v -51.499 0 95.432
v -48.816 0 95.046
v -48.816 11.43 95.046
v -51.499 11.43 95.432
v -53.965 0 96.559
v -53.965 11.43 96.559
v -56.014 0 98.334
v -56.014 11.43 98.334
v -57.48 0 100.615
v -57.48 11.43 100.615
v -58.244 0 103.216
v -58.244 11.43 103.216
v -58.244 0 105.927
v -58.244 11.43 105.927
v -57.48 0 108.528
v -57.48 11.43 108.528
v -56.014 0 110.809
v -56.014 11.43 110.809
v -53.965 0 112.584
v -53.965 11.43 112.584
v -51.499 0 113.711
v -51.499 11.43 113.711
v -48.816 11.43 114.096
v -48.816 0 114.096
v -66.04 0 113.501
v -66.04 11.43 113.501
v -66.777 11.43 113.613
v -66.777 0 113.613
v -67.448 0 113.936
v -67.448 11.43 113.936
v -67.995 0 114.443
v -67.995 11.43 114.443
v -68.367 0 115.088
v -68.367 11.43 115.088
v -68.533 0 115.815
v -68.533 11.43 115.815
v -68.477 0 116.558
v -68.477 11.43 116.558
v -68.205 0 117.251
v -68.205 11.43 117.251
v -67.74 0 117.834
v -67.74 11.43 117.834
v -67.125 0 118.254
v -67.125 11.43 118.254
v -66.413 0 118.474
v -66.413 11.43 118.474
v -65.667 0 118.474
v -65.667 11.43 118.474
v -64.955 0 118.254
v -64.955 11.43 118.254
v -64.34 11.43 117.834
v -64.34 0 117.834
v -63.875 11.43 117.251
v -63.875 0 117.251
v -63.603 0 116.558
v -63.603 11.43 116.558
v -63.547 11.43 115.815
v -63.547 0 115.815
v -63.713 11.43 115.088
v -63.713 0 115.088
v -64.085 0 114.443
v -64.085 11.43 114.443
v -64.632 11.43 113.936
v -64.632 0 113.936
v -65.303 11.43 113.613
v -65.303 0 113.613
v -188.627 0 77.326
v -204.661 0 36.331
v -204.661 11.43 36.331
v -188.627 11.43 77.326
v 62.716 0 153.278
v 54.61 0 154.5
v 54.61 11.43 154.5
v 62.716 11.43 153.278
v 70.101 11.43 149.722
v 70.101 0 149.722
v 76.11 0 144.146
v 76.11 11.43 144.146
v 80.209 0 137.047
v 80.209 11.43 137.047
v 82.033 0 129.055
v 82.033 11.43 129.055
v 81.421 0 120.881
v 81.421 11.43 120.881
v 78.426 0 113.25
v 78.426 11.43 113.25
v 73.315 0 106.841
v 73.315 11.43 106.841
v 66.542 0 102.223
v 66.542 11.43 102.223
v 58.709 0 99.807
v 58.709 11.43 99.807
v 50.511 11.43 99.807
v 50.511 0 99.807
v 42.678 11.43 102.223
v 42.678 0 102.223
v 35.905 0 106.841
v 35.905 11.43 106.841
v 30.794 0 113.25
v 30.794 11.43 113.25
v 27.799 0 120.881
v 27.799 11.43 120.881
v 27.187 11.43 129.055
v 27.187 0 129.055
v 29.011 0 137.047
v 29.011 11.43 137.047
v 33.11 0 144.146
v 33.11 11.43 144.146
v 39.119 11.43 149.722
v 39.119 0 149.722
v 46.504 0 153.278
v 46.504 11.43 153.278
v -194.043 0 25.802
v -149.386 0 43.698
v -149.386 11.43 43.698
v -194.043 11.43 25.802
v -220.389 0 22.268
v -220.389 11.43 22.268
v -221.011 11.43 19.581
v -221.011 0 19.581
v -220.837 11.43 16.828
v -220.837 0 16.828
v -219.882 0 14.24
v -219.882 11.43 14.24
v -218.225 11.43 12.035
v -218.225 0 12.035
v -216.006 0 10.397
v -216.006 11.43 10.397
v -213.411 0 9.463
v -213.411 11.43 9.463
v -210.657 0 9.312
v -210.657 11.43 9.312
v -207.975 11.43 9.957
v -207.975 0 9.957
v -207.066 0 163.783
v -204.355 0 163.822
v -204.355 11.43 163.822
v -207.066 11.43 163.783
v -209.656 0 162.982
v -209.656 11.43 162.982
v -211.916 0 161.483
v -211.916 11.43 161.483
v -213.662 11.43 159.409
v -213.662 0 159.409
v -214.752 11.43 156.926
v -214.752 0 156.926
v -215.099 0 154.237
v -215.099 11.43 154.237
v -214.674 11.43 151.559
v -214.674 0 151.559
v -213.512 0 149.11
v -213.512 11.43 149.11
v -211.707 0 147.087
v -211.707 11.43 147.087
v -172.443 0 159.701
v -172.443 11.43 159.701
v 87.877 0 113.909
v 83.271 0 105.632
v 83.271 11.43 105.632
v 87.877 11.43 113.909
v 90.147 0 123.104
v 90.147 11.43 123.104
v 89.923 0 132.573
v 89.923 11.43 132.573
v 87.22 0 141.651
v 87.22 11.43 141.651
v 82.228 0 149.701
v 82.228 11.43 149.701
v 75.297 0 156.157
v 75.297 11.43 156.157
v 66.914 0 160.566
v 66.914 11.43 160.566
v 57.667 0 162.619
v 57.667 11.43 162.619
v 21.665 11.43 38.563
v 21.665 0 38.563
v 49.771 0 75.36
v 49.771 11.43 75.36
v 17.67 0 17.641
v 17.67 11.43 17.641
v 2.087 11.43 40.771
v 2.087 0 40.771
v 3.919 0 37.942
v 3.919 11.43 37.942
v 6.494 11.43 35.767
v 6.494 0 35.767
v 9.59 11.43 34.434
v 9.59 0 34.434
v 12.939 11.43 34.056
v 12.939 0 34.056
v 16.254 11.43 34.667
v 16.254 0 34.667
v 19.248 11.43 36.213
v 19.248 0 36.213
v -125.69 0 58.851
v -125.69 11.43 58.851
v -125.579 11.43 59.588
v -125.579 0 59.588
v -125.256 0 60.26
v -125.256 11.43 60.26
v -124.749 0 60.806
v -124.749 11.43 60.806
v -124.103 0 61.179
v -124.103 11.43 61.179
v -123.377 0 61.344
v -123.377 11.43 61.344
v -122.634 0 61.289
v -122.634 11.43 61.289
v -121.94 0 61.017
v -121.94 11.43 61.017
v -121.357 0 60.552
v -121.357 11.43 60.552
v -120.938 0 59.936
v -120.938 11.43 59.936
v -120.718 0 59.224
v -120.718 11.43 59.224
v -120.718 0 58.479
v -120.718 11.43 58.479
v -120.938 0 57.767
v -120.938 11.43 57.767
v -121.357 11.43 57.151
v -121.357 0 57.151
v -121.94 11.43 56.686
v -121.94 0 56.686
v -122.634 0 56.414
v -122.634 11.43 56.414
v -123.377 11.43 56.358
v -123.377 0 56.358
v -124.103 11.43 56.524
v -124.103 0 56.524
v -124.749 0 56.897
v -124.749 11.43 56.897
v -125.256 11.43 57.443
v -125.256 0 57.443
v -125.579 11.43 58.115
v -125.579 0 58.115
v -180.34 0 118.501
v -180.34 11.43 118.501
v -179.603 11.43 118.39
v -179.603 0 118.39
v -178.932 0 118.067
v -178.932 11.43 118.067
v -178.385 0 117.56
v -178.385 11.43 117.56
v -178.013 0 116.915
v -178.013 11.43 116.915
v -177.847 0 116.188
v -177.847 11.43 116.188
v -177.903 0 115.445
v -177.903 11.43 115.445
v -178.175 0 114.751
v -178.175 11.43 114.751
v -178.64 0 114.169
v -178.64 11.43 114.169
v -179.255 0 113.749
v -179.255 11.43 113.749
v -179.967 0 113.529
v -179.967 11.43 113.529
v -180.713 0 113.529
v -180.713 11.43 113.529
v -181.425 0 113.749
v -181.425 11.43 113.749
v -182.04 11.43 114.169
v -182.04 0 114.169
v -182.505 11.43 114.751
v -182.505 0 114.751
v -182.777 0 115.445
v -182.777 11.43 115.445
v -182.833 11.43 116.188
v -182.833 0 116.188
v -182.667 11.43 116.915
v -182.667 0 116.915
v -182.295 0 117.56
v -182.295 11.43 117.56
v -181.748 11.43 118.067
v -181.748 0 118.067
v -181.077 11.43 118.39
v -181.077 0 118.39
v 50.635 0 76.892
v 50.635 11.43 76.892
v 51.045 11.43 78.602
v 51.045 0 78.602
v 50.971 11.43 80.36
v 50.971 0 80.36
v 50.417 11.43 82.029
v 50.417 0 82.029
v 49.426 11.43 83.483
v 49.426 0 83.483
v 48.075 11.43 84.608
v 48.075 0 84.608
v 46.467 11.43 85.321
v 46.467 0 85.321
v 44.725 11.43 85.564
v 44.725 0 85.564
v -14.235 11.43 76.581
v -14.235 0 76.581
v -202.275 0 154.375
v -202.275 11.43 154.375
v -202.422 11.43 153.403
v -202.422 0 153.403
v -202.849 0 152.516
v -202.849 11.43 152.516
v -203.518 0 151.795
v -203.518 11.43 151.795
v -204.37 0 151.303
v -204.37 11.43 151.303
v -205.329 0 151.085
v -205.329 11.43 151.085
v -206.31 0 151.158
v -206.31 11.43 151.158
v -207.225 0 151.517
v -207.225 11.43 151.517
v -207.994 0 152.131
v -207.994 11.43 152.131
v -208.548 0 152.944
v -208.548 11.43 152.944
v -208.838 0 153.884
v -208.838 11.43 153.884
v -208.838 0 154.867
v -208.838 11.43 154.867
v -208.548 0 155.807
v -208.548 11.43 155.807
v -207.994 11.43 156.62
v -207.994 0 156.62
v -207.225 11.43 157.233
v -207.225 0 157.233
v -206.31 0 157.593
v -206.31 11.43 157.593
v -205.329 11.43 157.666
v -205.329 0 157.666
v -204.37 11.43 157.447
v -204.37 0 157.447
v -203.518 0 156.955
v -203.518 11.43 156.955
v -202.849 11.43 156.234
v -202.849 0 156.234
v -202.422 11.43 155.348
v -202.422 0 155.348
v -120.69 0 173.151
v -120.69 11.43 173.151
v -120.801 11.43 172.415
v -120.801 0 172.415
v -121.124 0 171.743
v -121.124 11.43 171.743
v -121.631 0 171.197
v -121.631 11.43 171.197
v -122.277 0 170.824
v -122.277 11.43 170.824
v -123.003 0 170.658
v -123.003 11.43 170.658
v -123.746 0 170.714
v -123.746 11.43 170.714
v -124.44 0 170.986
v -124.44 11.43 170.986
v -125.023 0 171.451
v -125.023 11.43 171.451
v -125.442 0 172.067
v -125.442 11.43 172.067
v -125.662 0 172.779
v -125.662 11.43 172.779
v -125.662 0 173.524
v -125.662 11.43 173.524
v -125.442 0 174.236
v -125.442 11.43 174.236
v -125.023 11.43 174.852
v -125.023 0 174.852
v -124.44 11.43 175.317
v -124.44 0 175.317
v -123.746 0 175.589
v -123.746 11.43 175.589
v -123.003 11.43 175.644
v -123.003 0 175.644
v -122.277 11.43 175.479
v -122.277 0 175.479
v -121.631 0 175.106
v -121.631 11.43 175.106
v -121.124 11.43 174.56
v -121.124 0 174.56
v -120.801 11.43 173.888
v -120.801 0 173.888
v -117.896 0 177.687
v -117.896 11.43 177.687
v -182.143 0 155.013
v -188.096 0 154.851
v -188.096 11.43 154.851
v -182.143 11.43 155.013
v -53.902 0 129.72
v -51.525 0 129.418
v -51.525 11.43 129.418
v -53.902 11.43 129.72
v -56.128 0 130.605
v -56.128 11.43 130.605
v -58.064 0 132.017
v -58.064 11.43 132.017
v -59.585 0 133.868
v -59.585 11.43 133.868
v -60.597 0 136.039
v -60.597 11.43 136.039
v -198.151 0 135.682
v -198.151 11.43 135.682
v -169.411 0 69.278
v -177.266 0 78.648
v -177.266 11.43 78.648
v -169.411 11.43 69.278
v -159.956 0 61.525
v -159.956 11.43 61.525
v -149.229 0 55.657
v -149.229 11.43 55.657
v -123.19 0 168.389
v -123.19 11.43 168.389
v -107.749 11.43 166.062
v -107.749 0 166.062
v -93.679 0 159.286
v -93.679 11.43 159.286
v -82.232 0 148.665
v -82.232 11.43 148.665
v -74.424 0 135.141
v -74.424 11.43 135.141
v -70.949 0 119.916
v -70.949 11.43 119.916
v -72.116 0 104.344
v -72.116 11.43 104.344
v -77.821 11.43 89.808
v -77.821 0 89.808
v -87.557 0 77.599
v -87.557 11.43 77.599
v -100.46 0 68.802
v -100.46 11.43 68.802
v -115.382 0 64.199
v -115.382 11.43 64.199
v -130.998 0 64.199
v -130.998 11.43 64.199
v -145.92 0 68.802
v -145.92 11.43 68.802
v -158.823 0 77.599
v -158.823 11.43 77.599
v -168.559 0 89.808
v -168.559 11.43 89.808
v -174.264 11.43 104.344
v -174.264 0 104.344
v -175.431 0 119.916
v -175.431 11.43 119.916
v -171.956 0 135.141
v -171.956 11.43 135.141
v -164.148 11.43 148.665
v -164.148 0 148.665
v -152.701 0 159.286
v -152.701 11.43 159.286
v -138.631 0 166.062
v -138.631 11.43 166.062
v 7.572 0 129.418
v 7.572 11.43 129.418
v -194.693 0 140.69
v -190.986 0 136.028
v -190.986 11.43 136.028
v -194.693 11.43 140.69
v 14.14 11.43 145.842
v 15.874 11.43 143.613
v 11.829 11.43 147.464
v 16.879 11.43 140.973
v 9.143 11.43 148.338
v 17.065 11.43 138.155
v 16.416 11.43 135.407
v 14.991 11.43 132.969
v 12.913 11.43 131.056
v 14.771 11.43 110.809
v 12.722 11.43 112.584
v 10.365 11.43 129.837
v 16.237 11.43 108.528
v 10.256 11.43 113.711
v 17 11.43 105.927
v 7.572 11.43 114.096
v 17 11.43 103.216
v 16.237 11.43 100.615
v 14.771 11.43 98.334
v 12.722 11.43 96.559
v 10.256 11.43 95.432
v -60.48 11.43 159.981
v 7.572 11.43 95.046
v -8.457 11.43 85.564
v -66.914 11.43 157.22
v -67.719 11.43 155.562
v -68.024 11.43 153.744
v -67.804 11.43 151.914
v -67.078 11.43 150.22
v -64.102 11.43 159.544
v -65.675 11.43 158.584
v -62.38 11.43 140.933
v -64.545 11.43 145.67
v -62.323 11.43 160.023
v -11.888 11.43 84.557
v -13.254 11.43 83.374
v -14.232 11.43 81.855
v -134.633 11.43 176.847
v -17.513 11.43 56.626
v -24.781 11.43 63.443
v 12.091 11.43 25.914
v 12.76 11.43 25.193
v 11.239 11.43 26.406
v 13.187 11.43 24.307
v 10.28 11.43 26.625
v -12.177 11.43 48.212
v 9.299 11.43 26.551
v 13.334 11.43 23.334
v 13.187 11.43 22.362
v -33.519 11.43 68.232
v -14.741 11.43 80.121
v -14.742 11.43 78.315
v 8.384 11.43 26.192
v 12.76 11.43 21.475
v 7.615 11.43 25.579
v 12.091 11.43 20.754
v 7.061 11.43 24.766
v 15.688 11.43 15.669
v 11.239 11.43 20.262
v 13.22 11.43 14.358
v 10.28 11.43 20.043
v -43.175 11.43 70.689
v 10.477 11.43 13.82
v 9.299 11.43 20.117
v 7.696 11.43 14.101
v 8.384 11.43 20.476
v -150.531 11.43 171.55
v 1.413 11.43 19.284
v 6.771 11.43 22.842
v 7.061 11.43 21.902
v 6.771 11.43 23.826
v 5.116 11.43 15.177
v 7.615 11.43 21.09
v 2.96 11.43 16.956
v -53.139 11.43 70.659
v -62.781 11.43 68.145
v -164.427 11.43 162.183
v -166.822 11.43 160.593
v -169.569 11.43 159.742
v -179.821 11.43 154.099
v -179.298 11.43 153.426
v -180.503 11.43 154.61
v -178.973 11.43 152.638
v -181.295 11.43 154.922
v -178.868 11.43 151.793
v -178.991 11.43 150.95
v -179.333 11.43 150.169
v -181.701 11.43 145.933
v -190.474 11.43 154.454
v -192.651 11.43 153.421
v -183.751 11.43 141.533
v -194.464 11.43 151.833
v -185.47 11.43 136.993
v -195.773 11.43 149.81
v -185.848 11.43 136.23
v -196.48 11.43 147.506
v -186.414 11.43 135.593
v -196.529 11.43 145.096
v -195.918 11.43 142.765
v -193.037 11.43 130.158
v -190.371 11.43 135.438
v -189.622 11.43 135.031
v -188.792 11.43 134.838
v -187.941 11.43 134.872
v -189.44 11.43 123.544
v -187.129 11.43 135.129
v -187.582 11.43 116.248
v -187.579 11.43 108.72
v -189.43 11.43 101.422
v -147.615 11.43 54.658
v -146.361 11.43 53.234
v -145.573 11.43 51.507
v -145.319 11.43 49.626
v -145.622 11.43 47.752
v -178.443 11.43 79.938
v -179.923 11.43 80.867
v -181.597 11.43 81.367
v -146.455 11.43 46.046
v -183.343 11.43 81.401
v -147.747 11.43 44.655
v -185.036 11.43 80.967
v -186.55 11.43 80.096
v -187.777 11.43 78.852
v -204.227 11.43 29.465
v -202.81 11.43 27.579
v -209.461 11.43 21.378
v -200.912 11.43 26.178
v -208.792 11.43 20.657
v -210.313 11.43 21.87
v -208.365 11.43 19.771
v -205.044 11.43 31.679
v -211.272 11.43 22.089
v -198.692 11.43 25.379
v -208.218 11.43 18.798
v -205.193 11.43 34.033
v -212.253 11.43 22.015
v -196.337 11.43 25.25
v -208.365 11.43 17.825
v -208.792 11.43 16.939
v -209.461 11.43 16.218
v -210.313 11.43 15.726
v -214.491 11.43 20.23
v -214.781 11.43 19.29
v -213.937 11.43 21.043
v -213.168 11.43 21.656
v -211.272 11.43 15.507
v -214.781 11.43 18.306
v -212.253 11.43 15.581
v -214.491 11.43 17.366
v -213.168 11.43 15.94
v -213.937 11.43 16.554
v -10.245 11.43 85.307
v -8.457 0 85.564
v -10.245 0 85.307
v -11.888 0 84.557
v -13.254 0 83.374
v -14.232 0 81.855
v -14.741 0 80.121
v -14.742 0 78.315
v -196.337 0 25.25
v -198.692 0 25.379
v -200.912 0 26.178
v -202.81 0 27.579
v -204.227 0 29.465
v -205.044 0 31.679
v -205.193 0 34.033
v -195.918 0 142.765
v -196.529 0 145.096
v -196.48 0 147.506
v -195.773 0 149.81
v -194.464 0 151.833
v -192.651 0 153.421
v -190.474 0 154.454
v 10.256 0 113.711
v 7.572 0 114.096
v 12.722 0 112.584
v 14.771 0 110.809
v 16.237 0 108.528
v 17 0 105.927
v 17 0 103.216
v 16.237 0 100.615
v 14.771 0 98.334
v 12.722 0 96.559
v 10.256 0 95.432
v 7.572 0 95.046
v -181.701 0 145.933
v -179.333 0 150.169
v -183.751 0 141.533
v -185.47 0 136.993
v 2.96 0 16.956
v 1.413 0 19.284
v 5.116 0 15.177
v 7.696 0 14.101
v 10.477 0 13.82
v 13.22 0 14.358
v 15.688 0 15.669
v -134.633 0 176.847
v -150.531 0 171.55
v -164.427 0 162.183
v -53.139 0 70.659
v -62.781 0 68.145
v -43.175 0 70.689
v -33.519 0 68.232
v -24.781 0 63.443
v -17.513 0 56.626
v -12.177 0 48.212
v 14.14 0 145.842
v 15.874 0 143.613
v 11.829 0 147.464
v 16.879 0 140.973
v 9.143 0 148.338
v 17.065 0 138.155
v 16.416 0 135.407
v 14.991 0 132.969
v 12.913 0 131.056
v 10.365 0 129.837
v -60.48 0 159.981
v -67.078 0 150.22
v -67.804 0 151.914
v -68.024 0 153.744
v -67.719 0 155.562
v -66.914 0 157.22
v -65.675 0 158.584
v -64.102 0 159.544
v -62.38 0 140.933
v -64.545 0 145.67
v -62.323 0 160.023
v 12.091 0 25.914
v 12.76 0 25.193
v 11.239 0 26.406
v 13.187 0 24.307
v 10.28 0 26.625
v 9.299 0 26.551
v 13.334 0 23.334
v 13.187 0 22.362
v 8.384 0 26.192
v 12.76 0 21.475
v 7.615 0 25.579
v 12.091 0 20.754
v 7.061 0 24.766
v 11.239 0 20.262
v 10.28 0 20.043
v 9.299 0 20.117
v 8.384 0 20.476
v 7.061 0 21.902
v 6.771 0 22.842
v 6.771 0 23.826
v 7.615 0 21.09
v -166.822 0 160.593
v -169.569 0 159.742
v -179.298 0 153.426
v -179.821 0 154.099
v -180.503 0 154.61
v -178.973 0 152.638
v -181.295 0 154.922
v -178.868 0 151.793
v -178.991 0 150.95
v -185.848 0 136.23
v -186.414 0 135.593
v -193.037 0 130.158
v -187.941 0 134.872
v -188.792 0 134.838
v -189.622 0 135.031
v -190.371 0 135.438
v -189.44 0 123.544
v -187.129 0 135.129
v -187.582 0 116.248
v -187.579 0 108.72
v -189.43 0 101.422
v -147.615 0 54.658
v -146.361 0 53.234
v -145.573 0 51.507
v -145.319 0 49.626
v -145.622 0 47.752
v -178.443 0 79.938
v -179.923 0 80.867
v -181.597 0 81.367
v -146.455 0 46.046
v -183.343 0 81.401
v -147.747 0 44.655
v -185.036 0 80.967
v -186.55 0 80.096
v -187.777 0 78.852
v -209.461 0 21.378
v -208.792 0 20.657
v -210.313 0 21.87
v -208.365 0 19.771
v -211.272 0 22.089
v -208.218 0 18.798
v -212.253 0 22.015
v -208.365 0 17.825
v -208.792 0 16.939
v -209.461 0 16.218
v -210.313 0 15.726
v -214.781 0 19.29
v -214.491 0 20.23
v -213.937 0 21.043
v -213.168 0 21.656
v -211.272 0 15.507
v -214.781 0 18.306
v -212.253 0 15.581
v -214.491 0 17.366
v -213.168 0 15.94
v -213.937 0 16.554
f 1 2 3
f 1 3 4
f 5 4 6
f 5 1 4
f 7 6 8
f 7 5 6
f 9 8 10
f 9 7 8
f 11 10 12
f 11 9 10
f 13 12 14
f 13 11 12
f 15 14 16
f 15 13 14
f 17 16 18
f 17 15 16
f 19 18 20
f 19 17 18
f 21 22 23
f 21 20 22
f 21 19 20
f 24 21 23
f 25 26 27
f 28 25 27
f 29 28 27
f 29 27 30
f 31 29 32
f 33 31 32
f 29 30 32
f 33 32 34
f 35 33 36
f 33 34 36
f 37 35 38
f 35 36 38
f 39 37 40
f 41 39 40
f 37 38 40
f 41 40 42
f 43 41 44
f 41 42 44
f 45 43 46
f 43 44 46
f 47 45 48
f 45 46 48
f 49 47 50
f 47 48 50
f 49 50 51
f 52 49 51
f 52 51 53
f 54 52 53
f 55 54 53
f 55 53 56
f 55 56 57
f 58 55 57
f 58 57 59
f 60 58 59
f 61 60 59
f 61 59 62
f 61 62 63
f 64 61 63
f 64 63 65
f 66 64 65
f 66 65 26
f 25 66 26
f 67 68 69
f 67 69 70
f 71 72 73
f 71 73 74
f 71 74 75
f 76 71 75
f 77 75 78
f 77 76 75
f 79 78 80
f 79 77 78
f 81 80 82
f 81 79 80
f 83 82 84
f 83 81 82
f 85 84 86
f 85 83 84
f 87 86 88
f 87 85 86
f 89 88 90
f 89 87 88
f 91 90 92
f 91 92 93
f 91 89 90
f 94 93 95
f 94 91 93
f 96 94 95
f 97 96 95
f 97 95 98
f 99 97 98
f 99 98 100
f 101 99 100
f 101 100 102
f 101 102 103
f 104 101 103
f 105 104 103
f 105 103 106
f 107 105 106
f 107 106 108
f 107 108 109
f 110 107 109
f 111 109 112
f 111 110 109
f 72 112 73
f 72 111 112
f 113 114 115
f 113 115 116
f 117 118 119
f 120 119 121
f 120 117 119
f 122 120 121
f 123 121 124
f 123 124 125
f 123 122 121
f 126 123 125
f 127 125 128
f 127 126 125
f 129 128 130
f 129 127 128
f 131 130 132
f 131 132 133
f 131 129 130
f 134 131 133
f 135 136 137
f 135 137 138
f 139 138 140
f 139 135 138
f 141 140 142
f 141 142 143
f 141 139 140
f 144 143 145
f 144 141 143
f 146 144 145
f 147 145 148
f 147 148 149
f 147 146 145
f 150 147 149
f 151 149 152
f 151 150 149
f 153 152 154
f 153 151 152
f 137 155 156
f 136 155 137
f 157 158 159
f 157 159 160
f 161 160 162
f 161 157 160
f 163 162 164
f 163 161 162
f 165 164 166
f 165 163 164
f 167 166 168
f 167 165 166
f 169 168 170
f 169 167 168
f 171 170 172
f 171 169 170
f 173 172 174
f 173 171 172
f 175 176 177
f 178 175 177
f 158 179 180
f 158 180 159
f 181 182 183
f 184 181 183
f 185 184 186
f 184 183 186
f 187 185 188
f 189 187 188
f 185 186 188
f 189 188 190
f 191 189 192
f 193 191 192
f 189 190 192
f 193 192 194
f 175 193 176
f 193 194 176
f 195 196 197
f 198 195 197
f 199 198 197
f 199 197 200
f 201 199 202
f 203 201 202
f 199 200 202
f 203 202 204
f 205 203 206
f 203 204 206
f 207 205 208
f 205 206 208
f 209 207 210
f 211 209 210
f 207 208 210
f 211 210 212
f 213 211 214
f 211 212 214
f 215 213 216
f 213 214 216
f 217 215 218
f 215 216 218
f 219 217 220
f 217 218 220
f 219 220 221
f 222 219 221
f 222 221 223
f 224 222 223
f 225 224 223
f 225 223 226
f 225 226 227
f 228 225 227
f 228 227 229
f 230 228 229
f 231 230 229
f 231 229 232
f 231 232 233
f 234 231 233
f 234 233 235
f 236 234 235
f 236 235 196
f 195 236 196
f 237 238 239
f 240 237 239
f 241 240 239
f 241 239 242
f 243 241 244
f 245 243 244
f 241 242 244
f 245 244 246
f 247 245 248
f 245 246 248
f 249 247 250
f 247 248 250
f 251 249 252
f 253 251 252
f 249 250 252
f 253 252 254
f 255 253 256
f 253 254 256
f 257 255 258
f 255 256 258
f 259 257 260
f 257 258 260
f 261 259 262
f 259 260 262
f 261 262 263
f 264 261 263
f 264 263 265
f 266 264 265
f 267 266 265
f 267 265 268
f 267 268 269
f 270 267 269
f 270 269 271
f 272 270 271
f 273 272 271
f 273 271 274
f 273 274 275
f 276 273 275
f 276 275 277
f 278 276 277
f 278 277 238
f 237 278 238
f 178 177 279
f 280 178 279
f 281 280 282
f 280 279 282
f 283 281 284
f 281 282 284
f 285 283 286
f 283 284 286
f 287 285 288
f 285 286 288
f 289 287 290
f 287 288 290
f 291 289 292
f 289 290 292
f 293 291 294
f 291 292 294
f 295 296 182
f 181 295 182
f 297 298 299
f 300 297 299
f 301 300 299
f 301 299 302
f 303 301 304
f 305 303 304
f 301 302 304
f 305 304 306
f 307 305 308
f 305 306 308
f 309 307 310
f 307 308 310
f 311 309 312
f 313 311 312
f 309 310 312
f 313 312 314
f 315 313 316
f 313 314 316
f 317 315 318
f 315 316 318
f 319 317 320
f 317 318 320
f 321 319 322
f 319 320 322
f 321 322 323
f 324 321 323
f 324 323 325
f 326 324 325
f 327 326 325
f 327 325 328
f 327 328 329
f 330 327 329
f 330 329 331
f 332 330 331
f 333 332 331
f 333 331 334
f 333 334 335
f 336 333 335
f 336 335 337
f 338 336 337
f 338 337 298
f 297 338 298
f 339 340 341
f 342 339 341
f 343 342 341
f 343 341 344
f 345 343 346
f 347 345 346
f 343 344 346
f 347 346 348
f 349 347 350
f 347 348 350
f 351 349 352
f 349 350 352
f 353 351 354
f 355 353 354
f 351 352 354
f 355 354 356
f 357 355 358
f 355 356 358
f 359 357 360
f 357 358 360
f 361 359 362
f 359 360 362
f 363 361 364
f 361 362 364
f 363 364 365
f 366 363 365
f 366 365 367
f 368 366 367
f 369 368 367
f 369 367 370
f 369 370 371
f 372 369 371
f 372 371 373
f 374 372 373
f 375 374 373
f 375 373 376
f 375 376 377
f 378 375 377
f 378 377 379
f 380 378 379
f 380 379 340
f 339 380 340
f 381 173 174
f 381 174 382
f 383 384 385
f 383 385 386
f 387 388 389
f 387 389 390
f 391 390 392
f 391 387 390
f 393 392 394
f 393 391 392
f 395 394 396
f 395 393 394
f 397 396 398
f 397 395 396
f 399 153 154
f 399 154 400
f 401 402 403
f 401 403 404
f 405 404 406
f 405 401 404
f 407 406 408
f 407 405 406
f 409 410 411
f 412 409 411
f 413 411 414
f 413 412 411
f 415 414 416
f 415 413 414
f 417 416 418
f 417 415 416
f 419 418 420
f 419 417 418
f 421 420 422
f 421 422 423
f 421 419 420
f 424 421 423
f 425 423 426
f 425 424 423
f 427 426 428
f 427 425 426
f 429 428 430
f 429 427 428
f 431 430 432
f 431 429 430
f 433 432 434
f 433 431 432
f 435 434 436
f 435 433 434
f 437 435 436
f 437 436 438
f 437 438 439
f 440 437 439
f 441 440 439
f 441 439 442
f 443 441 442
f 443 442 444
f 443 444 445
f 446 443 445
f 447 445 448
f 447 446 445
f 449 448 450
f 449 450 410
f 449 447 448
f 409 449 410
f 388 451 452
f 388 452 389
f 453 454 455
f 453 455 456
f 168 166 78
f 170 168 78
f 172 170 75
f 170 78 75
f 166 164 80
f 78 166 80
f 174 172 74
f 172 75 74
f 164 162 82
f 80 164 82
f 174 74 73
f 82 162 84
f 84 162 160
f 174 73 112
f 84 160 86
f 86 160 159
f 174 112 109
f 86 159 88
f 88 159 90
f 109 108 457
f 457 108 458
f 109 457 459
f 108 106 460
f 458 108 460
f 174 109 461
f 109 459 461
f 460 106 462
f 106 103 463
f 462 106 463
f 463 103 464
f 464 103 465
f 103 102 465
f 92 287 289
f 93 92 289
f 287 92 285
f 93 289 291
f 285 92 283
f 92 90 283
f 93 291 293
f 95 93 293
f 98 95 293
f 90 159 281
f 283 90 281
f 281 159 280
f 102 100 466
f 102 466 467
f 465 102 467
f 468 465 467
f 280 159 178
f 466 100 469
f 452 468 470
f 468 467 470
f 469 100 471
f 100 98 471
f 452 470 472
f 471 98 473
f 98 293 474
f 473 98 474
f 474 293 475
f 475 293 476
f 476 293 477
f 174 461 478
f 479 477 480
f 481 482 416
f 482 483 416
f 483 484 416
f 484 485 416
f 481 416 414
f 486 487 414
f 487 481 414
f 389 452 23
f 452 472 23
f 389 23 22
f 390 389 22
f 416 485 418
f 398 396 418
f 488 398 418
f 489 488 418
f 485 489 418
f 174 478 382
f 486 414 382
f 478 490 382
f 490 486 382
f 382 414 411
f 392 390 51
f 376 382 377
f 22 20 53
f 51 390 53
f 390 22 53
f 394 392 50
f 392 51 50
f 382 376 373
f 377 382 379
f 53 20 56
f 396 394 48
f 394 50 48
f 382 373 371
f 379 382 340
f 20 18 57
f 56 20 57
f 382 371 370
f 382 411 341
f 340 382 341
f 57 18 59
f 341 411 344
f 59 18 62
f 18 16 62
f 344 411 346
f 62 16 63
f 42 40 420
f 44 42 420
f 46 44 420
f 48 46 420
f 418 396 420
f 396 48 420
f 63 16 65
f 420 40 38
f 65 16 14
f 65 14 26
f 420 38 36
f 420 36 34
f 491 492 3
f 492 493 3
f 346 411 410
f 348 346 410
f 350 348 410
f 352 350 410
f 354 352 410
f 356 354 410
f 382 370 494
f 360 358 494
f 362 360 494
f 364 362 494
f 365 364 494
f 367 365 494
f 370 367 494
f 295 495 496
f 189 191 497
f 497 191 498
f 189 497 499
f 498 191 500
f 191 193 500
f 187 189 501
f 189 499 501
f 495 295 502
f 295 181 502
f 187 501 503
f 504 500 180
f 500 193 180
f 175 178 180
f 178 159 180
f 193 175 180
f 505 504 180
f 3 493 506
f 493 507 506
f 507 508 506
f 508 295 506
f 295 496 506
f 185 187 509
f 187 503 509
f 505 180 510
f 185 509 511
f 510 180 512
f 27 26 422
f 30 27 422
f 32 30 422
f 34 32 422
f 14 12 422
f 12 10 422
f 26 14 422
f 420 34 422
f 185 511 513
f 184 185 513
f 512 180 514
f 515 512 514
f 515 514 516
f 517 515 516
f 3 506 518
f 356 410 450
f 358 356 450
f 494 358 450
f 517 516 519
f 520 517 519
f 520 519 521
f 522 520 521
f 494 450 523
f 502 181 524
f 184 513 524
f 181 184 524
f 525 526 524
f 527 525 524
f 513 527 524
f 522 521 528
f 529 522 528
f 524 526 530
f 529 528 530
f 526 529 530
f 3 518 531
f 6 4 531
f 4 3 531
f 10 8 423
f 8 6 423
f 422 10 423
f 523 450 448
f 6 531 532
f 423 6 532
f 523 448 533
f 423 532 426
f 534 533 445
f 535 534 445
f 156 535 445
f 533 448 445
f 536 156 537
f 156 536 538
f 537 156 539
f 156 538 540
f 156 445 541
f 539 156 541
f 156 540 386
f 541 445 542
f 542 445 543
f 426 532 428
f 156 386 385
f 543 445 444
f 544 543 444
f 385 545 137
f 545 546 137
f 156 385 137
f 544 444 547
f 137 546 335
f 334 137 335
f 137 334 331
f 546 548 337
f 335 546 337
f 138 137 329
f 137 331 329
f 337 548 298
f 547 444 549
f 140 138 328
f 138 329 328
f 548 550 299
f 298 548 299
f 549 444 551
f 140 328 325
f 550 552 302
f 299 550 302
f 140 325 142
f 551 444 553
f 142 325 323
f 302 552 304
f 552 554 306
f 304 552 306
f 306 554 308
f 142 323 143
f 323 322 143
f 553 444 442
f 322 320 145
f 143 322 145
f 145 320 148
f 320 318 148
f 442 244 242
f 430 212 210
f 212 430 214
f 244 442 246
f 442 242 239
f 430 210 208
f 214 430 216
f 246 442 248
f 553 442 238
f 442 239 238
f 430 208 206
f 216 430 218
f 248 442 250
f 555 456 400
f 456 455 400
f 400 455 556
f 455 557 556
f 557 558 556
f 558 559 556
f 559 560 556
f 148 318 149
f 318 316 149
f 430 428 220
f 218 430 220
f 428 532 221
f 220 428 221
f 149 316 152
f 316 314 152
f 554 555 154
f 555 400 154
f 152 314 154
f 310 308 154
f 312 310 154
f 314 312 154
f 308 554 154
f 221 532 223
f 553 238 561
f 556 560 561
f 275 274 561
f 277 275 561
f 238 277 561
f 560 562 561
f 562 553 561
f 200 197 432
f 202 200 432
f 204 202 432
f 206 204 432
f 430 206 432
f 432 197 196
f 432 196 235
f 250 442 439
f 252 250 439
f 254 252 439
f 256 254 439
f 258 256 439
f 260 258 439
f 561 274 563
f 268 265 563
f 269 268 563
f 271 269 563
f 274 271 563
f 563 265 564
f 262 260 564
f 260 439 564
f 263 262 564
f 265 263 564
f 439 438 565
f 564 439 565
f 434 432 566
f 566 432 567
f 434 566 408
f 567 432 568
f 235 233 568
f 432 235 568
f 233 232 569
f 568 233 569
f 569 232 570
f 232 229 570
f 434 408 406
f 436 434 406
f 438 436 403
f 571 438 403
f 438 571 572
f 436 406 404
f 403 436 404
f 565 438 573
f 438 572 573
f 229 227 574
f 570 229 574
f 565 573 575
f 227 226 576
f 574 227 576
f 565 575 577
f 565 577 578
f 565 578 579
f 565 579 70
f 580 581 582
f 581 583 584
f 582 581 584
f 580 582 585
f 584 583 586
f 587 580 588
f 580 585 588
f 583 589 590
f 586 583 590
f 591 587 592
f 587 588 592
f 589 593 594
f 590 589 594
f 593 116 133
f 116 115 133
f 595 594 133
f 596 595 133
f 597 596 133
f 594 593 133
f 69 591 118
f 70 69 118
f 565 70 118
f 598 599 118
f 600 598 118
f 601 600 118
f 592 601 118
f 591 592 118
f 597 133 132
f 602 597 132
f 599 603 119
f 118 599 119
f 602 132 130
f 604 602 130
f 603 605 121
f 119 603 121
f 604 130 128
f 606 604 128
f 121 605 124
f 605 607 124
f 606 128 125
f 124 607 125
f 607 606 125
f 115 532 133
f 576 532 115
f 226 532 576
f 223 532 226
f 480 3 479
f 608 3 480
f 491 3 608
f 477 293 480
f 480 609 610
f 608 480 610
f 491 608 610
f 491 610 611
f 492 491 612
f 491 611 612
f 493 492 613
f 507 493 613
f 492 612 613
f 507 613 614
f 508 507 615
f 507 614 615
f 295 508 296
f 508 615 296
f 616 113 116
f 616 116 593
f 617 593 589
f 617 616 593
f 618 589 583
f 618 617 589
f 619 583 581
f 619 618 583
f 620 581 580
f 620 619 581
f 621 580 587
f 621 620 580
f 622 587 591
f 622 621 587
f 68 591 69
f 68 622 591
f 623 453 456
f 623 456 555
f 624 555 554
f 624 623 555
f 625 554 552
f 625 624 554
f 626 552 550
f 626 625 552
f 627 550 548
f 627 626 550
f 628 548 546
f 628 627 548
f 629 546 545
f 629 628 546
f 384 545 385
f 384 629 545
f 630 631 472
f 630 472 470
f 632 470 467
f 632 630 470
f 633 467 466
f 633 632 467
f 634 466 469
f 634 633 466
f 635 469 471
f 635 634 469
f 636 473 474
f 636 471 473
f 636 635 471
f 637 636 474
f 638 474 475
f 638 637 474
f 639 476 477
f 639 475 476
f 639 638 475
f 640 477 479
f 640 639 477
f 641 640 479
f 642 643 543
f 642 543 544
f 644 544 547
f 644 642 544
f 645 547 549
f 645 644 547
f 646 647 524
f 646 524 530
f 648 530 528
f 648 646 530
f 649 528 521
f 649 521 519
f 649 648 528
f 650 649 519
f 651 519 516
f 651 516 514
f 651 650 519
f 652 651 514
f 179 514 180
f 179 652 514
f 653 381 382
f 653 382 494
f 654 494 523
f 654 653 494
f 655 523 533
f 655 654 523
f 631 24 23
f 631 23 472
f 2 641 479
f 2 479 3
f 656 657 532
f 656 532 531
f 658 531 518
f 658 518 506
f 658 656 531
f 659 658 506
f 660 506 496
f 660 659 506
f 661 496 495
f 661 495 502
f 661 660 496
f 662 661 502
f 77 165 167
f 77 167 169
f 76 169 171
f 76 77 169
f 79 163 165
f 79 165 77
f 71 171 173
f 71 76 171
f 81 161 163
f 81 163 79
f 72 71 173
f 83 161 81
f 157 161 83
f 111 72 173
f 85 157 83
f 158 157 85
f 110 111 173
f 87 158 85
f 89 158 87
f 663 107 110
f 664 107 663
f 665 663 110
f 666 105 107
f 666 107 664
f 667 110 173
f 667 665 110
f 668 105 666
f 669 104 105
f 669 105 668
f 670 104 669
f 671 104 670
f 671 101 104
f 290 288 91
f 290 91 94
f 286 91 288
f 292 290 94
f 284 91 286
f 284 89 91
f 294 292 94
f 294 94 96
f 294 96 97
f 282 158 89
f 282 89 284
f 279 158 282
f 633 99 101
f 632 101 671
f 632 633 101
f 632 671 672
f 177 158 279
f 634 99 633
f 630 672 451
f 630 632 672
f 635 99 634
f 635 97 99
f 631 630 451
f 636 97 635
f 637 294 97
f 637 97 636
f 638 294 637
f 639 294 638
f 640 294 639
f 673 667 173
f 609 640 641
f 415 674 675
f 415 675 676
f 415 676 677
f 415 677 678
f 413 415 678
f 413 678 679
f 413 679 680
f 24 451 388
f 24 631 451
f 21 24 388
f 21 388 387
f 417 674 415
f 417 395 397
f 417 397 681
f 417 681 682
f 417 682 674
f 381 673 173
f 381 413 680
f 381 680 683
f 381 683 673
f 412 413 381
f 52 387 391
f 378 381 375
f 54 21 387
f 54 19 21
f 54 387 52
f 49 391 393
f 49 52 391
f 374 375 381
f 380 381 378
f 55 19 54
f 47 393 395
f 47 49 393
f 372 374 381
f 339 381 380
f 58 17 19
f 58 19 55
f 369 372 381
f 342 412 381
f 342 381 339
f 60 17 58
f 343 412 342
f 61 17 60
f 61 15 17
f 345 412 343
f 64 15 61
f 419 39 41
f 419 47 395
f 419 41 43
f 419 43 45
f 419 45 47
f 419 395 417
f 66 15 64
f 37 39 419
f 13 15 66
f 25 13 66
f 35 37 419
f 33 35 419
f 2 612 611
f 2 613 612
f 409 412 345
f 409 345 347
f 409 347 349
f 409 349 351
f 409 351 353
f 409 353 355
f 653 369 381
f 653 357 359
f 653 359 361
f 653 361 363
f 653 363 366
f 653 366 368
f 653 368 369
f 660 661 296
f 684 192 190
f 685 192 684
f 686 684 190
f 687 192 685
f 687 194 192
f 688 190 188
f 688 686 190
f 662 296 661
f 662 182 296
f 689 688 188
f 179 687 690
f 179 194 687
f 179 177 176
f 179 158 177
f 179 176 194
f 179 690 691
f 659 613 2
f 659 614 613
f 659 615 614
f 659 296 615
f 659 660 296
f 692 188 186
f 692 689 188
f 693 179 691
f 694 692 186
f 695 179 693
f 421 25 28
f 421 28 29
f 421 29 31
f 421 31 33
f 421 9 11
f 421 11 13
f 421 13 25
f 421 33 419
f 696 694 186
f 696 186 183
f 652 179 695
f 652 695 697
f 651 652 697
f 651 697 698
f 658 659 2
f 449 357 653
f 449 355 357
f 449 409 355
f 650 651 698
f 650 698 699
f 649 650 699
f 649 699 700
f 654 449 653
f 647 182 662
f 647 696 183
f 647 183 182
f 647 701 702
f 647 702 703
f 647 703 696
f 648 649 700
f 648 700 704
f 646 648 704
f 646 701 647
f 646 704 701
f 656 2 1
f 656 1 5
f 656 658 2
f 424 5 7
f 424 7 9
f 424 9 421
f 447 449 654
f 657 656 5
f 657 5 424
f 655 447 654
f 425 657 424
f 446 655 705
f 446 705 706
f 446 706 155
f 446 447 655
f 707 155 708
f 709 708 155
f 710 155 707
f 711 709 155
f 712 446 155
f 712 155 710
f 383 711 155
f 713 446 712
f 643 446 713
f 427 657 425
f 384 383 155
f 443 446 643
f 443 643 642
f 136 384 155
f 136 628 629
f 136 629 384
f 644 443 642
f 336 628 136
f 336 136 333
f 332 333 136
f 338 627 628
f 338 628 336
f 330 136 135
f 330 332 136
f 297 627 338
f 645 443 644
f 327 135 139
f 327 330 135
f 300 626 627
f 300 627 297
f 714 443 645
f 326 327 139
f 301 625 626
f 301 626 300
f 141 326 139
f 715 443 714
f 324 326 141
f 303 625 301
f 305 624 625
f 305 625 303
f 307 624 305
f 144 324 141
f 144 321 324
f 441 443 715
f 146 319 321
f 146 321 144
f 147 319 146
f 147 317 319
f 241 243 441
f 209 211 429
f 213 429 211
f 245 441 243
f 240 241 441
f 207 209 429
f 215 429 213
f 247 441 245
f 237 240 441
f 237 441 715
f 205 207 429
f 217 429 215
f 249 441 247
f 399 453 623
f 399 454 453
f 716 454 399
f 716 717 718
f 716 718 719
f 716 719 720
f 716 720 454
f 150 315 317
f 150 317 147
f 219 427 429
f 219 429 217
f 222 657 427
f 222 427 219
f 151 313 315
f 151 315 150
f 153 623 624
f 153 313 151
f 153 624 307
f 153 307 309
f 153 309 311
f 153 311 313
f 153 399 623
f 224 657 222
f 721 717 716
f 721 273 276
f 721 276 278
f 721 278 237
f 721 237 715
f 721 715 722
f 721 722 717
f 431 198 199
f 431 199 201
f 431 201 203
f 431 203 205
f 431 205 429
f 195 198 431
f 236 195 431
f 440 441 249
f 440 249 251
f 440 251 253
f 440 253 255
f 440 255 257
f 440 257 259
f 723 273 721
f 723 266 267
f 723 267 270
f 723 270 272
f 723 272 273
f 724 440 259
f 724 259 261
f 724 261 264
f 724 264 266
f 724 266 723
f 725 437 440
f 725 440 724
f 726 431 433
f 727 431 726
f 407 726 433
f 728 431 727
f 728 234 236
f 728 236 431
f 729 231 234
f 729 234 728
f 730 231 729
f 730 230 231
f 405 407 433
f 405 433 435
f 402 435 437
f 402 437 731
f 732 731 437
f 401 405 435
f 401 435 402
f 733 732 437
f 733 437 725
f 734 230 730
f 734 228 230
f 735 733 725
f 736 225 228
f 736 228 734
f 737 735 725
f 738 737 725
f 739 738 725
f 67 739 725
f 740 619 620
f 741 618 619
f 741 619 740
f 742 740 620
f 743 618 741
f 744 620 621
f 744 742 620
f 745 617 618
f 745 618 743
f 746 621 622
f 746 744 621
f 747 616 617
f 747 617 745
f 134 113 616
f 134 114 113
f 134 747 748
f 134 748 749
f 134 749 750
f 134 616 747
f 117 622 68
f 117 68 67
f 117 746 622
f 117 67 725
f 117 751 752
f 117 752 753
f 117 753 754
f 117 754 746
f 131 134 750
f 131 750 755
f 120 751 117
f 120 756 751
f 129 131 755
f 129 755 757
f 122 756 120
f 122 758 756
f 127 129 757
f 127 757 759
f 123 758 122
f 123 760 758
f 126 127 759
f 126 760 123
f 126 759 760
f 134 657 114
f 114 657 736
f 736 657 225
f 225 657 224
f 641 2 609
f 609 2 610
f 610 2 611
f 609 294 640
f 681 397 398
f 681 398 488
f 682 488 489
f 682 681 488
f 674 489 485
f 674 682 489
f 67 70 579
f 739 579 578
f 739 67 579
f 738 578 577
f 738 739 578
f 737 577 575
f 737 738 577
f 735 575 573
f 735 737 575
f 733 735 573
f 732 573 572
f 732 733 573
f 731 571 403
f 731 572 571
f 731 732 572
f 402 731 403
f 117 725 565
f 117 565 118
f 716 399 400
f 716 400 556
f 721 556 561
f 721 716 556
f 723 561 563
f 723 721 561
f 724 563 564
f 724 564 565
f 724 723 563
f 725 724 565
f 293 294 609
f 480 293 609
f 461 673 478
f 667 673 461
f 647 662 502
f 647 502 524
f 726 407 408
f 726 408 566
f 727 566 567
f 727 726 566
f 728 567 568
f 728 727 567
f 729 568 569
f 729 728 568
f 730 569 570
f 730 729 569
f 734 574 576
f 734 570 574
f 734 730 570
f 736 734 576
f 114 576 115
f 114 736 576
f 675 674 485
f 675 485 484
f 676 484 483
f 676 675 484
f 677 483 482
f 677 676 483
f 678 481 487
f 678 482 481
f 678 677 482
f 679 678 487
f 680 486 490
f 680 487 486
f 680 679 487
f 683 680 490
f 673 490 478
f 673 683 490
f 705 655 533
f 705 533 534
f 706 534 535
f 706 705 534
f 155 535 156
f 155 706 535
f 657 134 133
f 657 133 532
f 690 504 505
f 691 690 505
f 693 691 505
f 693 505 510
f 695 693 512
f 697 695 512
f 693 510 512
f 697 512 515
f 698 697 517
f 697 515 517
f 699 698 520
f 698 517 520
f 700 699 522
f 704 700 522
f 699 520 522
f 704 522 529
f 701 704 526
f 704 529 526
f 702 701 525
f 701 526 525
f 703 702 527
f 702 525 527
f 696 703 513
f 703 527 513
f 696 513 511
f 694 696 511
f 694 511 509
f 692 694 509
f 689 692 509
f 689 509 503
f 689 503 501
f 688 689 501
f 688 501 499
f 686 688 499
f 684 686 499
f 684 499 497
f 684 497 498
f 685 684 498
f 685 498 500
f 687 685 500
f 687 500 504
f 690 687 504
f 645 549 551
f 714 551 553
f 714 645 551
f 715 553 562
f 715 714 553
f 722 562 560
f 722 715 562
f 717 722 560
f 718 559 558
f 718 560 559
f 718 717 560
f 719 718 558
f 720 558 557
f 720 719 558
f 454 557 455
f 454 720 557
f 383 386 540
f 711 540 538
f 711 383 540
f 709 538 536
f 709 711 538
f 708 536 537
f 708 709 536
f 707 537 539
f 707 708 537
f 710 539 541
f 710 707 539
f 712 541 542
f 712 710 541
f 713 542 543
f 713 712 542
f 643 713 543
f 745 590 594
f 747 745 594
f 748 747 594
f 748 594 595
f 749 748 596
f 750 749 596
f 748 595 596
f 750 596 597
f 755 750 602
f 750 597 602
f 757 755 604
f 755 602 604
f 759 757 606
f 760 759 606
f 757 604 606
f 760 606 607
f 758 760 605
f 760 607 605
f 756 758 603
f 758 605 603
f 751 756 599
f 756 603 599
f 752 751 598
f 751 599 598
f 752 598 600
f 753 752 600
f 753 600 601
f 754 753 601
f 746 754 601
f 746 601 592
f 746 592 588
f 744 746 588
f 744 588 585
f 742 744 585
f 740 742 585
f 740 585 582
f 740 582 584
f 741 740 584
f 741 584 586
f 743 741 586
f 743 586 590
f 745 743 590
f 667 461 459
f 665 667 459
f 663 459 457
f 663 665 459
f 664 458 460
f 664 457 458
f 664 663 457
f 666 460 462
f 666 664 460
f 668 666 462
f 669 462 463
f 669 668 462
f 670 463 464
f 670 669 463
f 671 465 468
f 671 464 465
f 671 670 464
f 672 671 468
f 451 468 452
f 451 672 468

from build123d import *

# Parameters (mm, degrees)
SKETCH1_R             = 52.3875
SKETCH1_R_2           = 27.49999999
BOSS_EXTRUDE1_DEPTH   = 11.43
M6_CLEARANCE_HOLE1_D  = 6.6
F_5_0MM_DOWEL_HOLE1_D = 5
CIRPATTERN1_COUNT     = 4
CUT_EXTRUDE1_DEPTH    = 284.979078357
CUT_EXTRUDE2_DEPTH    = 284.979078357


with BuildPart() as part:
    # Sketch1 → Boss-Extrude1 (new body)
    with BuildSketch(Plane(origin=(0, 0, 0), x_dir=(1, 0, 0), z_dir=(0, 1, 0))):
        with BuildLine():
            Line((-207.974881785, -9.956762437), (-62.780706514, -68.14502812))
            ThreePointArc((-62.780706514, -68.14502812), (-33.518744337, -68.231765471), (-12.176603989, -48.212200061))
            Line((-12.176603989, -48.212200061), (1.412558245, -19.284326264))
            ThreePointArc((1.412558245, -19.284326264), (9.075779399, -13.857488875), (17.670000792, -17.640990049))
            Line((17.670000792, -17.640990049), (83.271163186, -105.631794066))
            ThreePointArc((83.271163186, -105.631794066), (87.219797031, -141.651403947), (57.667100455, -162.619048791))
            Line((57.667100455, -162.619048791), (-117.895657849, -177.687193688))
            ThreePointArc((-117.895657849, -177.687193688), (-142.761859432, -174.739029029), (-164.426538493, -162.182702446))
            ThreePointArc((-164.426538493, -162.182702446), (-168.164823601, -160.06920649), (-172.443362527, -159.700770109))
            Line((-172.443362527, -159.700770109), (-204.355245166, -163.82191268))
            ThreePointArc((-204.355245166, -163.82191268), (-214.295764489, -158.206433226), (-211.707233022, -147.086764223))
            Line((-211.707233022, -147.086764223), (-198.151371623, -135.681934472))
            ThreePointArc((-198.151371623, -135.681934472), (-188.283833694, -119.954004575), (-189.430137427, -101.422354045))
            Line((-189.430137427, -101.422354045), (-220.388836369, -22.267635732))
            ThreePointArc((-220.388836369, -22.267635732), (-218.225236723, -12.034965467), (-207.974881785, -9.956762437))
        make_face()
        with Locations(Location((-123.19, -116.001477372, 0), (0, 0, 270))):
            Circle(SKETCH1_R, mode=Mode.SUBTRACT)
        with Locations(Location((54.61, -127, 0), (0, 0, 270))):
            Circle(SKETCH1_R_2, mode=Mode.SUBTRACT)
    extrude(amount=BOSS_EXTRUDE1_DEPTH)

    # M6 Clearance Hole1 (through all)
    with Locations(Plane(origin=(0, 0, 0), x_dir=(-1, 0, 0), z_dir=(0, -1, 0))):
        with Locations((-10.033704867, -23.334197365), (211.518182886, -18.798178744), (205.575185514, -154.375359311)):
            Hole(M6_CLEARANCE_HOLE1_D / 2)

    # Ø5.0mm Dowel Hole1 (through all)
    with Locations(Plane(origin=(0, 0, 0), x_dir=(-1, 0, 0), z_dir=(0, -1, 0))):
        with Locations((123.19, -173.151477372)):
            f_5_0mm_dowel_hole1 = Hole(F_5_0MM_DOWEL_HOLE1_D / 2)

    # CirPattern1: Ø5.0mm Dowel Hole1 ×4 about axis
    cirpattern1_axis = Axis((-123.19, 0, 116.001477372), (0, 1, 0))
    for i in range(1, CIRPATTERN1_COUNT):
        add(f_5_0mm_dowel_hole1.rotate(cirpattern1_axis, i * 360 / CIRPATTERN1_COUNT), mode=Mode.SUBTRACT)

    # Sketch6 → Cut-Extrude1 (cut, through all)
    with BuildSketch(Plane.XZ):
        with BuildLine():
            Line((-14.234653979, 76.580666612), (2.086502597, 40.770912553))
            ThreePointArc((2.086502597, 40.770912553), (11.250375023, 34.121155358), (21.665234735, 38.562610722))
            Line((21.665234735, 38.562610722), (49.771061223, 75.359760223))
            ThreePointArc((49.771061223, 75.359760223), (50.416714446, 82.029052969), (44.724694776, 85.564197365))
            Line((44.724694776, 85.564197365), (-8.456504121, 85.564197365))
            ThreePointArc((-8.456504121, 85.564197365), (-13.797169823, 82.649279585), (-14.234653979, 76.580666612))
        make_face()
        with BuildLine():
            Line((-204.660650751, 36.331409888), (-188.626913597, 77.326218823))
            ThreePointArc((-188.626913597, 77.326218823), (-183.343464985, 81.400582198), (-177.265672517, 78.648182362))
            ThreePointArc((-177.265672517, 78.648182362), (-164.864290964, 65.181201114), (-149.229324423, 55.657458697))
            ThreePointArc((-149.229324423, 55.657458697), (-145.319075006, 49.625624375), (-149.386073966, 43.698348841))
            Line((-149.386073966, 43.698348841), (-194.042740287, 25.801666969))
            ThreePointArc((-194.042740287, 25.801666969), (-202.810079512, 27.579196728), (-204.660650751, 36.331409888))
        make_face()
        with BuildLine():
            Line((-190.985681304, 136.027573744), (-194.692687992, 140.689511725))
            ThreePointArc((-194.692687992, 140.689511725), (-195.773357295, 149.809803058), (-188.096484537, 154.850952212))
            Line((-188.096484537, 154.850952212), (-182.142551509, 155.01295786))
            ThreePointArc((-182.142551509, 155.01295786), (-179.298484939, 153.425933155), (-179.332786017, 150.169219243))
            ThreePointArc((-179.332786017, 150.169219243), (-182.766707481, 143.751485155), (-185.46990532, 136.993390091))
            ThreePointArc((-185.46990532, 136.993390091), (-187.940827525, 134.871620657), (-190.985681304, 136.027573744))
        make_face()
    extrude(amount=-CUT_EXTRUDE1_DEPTH, mode=Mode.SUBTRACT)

    # Sketch7 → Cut-Extrude2 (cut, through all)
    with BuildSketch(Plane.XZ):
        with BuildLine():
            Line((-48.815667356, 114.096477372), (7.572332644, 114.096477372))
            ThreePointArc((7.572332644, 114.096477372), (17.097332644, 104.571477372), (7.572332644, 95.046477372))
            Line((7.572332644, 95.046477372), (-48.815667356, 95.046477372))
            ThreePointArc((-48.815667356, 95.046477372), (-58.340667356, 104.571477372), (-48.815667356, 114.096477372))
        make_face()
        with BuildLine():
            Line((-60.480063265, 159.980626251), (9.143311078, 148.338049571))
            ThreePointArc((9.143311078, 148.338049571), (17.064665217, 138.155302762), (7.572332644, 129.418495204))
            Line((7.572332644, 129.418495204), (-51.525154545, 129.418495204))
            ThreePointArc((-51.525154545, 129.418495204), (-57.140513894, 131.249772802), (-60.59665397, 136.039442314))
            ThreePointArc((-60.59665397, 136.039442314), (-63.415414116, 143.322639291), (-67.078188304, 150.220062883))
            ThreePointArc((-67.078188304, 150.220062883), (-66.914295931, 157.219714512), (-60.480063265, 159.980626251))
        make_face()
    extrude(amount=-CUT_EXTRUDE2_DEPTH, mode=Mode.SUBTRACT)


solid = part.part
